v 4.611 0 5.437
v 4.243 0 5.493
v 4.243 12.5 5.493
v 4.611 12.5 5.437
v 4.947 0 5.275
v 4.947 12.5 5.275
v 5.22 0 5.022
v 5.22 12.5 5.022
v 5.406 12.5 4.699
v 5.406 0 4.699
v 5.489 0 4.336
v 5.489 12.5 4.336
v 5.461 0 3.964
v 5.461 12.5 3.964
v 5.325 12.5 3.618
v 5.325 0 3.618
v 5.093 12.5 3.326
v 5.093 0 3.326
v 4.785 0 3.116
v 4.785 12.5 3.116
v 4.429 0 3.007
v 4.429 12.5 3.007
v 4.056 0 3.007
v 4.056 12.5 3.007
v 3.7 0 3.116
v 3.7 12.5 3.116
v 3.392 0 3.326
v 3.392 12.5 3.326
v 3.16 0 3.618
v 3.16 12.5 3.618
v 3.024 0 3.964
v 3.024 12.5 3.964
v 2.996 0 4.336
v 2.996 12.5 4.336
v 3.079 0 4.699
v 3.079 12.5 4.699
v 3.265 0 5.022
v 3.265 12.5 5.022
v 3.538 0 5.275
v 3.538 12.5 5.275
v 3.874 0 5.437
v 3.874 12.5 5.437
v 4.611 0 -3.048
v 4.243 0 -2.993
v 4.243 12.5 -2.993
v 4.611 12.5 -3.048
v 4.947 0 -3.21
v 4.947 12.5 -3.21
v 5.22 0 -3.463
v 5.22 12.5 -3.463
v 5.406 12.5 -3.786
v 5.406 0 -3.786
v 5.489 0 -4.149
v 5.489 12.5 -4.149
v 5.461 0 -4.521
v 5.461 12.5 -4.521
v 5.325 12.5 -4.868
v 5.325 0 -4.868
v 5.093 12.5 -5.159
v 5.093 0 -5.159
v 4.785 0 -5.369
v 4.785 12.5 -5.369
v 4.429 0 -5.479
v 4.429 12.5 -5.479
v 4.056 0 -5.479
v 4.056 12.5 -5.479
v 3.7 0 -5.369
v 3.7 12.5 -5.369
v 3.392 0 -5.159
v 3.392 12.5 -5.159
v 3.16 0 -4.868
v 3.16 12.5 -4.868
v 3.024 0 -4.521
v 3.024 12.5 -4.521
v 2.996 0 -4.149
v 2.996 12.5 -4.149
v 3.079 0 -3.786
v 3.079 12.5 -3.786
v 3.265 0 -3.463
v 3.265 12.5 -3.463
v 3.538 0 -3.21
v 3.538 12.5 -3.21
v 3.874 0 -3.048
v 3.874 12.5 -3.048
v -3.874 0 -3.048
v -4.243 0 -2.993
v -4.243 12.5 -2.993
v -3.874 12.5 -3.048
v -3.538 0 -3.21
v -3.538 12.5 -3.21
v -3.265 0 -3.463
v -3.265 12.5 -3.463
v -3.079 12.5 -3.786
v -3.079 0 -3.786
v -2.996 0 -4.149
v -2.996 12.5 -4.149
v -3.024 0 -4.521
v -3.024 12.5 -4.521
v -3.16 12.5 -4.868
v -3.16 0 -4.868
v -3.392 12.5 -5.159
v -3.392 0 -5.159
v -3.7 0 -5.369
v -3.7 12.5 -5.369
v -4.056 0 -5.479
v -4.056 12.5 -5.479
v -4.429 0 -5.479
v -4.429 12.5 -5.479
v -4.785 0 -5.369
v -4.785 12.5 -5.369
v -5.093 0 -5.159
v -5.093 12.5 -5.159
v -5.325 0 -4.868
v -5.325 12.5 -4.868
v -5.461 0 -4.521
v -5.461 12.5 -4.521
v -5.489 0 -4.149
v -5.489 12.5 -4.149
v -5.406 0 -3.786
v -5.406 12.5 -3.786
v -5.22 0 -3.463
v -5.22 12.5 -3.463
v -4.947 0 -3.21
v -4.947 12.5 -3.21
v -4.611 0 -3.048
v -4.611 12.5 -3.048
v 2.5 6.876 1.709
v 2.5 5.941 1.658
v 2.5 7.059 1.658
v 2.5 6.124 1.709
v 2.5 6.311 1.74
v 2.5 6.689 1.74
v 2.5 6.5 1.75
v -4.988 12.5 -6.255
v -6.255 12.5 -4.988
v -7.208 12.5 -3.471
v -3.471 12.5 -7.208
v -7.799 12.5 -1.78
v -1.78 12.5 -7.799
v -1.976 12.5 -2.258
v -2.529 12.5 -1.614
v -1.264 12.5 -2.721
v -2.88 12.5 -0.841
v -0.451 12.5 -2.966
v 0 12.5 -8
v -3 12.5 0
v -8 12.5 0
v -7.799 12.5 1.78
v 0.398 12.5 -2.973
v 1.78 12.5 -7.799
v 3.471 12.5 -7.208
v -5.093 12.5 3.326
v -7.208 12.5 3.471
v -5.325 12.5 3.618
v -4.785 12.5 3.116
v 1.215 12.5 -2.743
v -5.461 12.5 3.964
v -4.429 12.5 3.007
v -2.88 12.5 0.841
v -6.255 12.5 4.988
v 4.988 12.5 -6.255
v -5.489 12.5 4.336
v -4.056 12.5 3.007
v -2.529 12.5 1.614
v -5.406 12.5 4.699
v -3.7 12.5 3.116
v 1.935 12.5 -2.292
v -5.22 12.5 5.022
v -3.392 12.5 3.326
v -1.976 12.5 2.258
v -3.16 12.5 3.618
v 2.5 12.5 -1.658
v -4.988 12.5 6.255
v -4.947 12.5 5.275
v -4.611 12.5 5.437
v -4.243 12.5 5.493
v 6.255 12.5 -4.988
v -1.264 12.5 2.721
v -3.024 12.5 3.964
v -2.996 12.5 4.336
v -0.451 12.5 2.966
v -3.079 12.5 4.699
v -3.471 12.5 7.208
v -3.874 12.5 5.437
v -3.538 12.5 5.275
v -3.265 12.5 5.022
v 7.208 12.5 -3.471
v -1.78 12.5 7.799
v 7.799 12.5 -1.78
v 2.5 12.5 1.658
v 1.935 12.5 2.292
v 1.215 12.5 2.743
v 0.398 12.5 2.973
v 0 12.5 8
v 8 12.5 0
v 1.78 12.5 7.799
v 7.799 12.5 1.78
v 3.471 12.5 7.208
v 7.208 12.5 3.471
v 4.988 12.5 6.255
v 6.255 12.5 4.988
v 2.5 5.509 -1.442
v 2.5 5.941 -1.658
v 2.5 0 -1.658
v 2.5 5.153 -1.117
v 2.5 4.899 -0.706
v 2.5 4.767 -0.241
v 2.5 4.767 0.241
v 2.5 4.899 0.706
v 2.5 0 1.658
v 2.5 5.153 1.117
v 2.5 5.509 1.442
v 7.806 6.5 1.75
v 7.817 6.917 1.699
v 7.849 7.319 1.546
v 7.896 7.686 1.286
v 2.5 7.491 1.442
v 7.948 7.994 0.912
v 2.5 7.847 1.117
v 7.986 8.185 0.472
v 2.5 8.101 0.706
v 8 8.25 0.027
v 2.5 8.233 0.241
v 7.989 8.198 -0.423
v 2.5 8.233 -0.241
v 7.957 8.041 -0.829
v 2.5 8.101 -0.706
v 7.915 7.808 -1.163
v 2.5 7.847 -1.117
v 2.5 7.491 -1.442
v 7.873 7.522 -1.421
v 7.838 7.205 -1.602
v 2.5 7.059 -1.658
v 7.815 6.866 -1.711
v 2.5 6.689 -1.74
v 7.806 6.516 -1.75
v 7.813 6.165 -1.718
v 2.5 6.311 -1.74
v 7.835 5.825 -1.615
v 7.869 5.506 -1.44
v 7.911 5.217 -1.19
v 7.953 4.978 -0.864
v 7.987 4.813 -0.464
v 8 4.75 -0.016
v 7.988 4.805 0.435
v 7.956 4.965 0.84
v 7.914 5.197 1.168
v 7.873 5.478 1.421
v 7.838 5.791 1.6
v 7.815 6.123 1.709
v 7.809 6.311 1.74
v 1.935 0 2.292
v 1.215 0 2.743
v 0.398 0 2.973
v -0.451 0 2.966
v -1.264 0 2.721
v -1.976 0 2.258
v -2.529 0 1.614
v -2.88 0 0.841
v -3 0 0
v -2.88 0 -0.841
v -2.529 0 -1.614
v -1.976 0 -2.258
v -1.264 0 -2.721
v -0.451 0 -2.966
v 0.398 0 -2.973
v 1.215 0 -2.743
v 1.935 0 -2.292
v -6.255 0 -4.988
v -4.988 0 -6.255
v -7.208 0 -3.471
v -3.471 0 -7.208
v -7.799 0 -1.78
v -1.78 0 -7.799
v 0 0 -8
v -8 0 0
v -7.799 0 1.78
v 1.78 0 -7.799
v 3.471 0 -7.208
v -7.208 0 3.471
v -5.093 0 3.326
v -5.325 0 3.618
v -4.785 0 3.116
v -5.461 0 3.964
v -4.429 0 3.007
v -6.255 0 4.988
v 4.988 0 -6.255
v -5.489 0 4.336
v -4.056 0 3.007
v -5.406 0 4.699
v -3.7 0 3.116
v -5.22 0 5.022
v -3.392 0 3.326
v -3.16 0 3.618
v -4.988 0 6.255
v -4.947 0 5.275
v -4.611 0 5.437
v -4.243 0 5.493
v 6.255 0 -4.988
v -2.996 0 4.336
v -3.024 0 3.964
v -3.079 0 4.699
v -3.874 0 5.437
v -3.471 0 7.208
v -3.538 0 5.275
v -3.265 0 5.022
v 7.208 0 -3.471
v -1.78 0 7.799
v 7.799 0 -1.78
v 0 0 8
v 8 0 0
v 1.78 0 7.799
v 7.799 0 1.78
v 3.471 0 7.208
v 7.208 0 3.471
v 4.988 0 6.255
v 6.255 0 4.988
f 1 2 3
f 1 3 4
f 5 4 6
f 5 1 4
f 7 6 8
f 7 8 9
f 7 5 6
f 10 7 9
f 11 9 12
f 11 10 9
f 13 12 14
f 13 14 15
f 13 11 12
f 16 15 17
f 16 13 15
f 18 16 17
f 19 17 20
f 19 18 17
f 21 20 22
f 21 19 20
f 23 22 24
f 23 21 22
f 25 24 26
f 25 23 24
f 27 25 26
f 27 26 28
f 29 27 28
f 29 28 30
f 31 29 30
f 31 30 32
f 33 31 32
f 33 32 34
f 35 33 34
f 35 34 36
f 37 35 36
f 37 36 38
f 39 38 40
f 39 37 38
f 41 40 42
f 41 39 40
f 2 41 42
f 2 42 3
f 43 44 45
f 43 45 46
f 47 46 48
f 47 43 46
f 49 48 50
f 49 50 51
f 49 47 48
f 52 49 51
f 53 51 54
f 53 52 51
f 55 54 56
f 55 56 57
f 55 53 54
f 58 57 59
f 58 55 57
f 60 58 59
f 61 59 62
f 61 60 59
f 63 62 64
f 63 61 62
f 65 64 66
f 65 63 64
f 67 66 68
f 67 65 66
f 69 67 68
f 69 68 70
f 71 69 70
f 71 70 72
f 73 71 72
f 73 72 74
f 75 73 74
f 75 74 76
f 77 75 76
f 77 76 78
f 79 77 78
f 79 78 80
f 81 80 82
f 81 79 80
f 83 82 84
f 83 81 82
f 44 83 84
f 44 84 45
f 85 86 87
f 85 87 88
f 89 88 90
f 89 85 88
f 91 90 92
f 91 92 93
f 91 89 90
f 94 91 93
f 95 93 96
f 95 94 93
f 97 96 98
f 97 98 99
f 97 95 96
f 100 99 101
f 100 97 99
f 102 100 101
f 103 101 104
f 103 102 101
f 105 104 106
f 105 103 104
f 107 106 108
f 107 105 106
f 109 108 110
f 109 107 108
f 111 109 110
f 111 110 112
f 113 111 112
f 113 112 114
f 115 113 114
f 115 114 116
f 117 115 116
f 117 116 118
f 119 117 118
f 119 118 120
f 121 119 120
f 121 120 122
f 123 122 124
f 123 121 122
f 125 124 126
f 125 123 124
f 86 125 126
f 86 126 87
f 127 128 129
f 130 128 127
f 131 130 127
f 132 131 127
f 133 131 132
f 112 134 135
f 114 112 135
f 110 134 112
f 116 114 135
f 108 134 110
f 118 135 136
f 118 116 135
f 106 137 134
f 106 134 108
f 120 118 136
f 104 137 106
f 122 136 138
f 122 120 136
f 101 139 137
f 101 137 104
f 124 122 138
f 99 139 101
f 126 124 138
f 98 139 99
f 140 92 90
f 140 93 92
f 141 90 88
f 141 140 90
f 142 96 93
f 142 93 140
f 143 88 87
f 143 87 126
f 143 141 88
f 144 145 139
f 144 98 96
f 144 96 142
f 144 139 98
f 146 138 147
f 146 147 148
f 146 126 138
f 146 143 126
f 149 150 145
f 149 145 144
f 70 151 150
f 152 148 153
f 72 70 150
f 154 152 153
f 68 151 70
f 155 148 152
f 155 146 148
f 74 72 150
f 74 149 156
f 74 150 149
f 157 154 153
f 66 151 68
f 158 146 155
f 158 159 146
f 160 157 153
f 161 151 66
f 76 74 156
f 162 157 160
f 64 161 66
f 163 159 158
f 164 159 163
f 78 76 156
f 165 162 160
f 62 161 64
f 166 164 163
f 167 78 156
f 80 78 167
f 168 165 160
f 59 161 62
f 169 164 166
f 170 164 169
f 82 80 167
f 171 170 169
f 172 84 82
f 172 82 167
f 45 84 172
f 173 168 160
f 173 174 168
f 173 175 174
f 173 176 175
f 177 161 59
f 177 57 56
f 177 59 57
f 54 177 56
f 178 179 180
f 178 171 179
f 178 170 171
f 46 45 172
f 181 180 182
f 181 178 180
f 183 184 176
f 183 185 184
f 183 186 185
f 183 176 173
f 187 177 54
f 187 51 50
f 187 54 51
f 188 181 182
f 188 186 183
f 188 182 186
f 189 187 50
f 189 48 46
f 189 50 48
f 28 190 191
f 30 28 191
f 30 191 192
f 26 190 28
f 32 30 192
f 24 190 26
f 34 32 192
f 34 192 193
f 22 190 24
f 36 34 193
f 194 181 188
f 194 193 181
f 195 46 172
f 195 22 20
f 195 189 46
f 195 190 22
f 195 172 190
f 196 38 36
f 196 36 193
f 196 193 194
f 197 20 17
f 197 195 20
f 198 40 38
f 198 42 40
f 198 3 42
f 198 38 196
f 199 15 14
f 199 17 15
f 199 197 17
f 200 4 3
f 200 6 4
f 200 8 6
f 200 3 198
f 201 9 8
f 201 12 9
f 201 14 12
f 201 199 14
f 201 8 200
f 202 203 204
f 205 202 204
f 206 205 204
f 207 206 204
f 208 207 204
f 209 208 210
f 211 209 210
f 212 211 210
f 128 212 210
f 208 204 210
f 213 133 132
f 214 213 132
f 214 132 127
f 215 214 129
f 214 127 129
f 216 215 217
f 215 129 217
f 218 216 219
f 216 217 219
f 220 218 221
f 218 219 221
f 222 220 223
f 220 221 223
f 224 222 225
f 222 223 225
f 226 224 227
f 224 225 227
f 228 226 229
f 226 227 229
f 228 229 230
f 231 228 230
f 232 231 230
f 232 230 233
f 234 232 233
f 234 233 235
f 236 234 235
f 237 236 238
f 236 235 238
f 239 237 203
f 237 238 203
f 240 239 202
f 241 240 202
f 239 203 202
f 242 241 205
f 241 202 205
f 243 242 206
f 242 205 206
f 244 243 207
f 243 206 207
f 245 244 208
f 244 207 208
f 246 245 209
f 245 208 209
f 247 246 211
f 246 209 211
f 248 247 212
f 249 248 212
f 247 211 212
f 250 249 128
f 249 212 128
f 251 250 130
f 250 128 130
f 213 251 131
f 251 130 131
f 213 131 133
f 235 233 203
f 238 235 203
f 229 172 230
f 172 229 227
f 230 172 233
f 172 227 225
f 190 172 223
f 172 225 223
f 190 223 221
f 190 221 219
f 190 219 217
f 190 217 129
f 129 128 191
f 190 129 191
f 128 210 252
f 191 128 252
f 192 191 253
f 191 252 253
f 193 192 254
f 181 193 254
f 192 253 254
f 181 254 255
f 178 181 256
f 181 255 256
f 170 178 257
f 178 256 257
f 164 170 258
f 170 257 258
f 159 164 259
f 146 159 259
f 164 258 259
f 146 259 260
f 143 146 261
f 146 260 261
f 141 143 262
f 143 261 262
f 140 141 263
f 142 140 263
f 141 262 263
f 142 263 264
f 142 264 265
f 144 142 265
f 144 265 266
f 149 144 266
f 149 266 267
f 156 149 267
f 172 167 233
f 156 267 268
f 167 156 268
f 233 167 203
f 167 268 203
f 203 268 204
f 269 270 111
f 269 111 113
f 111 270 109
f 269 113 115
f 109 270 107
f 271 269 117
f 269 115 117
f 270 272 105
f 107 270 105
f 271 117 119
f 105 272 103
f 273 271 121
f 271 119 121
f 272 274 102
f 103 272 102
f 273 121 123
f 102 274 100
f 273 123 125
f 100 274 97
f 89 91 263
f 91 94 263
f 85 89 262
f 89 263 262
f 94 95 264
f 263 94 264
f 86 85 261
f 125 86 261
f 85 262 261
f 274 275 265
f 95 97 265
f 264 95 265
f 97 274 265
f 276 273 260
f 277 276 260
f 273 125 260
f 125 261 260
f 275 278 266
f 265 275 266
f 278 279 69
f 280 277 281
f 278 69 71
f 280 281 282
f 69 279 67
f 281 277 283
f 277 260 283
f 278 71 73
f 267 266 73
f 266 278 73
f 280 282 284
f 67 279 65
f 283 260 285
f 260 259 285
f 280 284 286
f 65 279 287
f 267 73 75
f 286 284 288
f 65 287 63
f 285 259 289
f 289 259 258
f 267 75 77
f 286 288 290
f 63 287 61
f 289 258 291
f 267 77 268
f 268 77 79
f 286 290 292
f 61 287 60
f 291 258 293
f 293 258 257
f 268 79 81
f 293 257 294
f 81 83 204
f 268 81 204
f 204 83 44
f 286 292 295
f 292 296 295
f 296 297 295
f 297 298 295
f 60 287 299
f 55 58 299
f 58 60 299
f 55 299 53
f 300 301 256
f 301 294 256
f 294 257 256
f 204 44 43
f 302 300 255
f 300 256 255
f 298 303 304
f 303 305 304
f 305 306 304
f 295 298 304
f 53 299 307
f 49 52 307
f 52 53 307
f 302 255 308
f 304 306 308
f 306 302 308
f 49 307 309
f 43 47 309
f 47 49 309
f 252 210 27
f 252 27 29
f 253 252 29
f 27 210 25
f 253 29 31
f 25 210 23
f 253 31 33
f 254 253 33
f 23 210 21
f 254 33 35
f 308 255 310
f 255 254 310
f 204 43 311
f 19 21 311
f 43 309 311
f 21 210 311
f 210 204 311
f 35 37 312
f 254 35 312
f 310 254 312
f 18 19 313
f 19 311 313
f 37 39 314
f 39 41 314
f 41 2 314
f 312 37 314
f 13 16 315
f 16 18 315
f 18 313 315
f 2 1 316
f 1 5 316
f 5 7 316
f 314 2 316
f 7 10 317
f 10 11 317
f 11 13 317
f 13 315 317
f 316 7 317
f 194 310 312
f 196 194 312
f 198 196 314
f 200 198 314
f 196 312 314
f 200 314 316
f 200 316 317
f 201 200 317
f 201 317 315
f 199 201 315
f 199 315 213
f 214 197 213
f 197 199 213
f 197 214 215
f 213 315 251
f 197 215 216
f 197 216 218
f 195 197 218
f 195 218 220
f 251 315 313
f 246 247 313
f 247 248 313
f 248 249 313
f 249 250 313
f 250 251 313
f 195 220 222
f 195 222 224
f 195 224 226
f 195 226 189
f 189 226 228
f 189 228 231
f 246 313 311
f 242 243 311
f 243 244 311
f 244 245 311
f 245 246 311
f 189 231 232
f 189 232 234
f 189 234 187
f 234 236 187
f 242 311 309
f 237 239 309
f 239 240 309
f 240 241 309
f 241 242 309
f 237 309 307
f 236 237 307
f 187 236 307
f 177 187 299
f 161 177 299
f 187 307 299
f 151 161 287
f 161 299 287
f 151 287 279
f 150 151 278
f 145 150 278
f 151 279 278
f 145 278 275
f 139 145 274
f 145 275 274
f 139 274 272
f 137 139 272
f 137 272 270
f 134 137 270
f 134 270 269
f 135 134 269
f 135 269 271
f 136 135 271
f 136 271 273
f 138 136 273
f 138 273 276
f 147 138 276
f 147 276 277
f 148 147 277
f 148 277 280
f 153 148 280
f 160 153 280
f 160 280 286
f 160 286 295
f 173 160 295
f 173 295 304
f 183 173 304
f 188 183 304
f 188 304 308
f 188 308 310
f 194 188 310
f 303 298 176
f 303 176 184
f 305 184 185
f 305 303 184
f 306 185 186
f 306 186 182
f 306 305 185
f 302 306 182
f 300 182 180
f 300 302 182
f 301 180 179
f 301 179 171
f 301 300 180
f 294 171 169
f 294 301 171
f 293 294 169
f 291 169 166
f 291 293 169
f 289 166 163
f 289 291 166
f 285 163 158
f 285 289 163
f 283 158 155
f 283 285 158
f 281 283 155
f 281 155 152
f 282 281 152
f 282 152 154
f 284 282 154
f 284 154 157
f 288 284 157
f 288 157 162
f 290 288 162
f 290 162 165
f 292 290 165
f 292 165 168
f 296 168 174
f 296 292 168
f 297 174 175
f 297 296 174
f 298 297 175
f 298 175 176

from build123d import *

# Parameters (mm, degrees)
SKETCH_1_R          = 8
SKETCH_1_R_2        = 1.25
EXTRUDE_1_DEPTH     = 12.5
SKETCH_3_R          = 1.75
CUT_EXTRUDE_1_DEPTH = 10


with BuildPart() as part:
    # 草图1 → 凸台-拉伸1 (new body)
    with BuildSketch(Plane(origin=(0, 0, 0), x_dir=(1, 0, 0), z_dir=(0, 1, 0))):
        with Locations(Location((0, 0, 0), (0, 0, 270))):
            Circle(SKETCH_1_R)
        with Locations(Location((4.242640687, 4.242640687, 0), (0, 0, 270))):
            Circle(SKETCH_1_R_2, mode=Mode.SUBTRACT)
        with Locations(Location((4.242640687, -4.242640687, 0), (0, 0, 270))):
            Circle(SKETCH_1_R_2, mode=Mode.SUBTRACT)
        with Locations(Location((-4.242640687, -4.242640687, 0), (0, 0, 270))):
            Circle(SKETCH_1_R_2, mode=Mode.SUBTRACT)
        with Locations(Location((-4.242640687, 4.242640687, 0), (0, 0, 270))):
            Circle(SKETCH_1_R_2, mode=Mode.SUBTRACT)
        with BuildLine():
            Line((2.5, 1.658312395), (2.5, -1.658312395))
            ThreePointArc((2.5, -1.658312395), (-3, 0), (2.5, 1.658312395))
        make_face(mode=Mode.SUBTRACT)
    extrude(amount=EXTRUDE_1_DEPTH)

    # 草图3 → 切除-拉伸1 (cut)
    with BuildSketch(Plane.ZY.offset(-2.5)):
        with Locations((0, 6.5)):
            Circle(SKETCH_3_R)
    extrude(amount=-CUT_EXTRUDE_1_DEPTH, mode=Mode.SUBTRACT)


solid = part.part
